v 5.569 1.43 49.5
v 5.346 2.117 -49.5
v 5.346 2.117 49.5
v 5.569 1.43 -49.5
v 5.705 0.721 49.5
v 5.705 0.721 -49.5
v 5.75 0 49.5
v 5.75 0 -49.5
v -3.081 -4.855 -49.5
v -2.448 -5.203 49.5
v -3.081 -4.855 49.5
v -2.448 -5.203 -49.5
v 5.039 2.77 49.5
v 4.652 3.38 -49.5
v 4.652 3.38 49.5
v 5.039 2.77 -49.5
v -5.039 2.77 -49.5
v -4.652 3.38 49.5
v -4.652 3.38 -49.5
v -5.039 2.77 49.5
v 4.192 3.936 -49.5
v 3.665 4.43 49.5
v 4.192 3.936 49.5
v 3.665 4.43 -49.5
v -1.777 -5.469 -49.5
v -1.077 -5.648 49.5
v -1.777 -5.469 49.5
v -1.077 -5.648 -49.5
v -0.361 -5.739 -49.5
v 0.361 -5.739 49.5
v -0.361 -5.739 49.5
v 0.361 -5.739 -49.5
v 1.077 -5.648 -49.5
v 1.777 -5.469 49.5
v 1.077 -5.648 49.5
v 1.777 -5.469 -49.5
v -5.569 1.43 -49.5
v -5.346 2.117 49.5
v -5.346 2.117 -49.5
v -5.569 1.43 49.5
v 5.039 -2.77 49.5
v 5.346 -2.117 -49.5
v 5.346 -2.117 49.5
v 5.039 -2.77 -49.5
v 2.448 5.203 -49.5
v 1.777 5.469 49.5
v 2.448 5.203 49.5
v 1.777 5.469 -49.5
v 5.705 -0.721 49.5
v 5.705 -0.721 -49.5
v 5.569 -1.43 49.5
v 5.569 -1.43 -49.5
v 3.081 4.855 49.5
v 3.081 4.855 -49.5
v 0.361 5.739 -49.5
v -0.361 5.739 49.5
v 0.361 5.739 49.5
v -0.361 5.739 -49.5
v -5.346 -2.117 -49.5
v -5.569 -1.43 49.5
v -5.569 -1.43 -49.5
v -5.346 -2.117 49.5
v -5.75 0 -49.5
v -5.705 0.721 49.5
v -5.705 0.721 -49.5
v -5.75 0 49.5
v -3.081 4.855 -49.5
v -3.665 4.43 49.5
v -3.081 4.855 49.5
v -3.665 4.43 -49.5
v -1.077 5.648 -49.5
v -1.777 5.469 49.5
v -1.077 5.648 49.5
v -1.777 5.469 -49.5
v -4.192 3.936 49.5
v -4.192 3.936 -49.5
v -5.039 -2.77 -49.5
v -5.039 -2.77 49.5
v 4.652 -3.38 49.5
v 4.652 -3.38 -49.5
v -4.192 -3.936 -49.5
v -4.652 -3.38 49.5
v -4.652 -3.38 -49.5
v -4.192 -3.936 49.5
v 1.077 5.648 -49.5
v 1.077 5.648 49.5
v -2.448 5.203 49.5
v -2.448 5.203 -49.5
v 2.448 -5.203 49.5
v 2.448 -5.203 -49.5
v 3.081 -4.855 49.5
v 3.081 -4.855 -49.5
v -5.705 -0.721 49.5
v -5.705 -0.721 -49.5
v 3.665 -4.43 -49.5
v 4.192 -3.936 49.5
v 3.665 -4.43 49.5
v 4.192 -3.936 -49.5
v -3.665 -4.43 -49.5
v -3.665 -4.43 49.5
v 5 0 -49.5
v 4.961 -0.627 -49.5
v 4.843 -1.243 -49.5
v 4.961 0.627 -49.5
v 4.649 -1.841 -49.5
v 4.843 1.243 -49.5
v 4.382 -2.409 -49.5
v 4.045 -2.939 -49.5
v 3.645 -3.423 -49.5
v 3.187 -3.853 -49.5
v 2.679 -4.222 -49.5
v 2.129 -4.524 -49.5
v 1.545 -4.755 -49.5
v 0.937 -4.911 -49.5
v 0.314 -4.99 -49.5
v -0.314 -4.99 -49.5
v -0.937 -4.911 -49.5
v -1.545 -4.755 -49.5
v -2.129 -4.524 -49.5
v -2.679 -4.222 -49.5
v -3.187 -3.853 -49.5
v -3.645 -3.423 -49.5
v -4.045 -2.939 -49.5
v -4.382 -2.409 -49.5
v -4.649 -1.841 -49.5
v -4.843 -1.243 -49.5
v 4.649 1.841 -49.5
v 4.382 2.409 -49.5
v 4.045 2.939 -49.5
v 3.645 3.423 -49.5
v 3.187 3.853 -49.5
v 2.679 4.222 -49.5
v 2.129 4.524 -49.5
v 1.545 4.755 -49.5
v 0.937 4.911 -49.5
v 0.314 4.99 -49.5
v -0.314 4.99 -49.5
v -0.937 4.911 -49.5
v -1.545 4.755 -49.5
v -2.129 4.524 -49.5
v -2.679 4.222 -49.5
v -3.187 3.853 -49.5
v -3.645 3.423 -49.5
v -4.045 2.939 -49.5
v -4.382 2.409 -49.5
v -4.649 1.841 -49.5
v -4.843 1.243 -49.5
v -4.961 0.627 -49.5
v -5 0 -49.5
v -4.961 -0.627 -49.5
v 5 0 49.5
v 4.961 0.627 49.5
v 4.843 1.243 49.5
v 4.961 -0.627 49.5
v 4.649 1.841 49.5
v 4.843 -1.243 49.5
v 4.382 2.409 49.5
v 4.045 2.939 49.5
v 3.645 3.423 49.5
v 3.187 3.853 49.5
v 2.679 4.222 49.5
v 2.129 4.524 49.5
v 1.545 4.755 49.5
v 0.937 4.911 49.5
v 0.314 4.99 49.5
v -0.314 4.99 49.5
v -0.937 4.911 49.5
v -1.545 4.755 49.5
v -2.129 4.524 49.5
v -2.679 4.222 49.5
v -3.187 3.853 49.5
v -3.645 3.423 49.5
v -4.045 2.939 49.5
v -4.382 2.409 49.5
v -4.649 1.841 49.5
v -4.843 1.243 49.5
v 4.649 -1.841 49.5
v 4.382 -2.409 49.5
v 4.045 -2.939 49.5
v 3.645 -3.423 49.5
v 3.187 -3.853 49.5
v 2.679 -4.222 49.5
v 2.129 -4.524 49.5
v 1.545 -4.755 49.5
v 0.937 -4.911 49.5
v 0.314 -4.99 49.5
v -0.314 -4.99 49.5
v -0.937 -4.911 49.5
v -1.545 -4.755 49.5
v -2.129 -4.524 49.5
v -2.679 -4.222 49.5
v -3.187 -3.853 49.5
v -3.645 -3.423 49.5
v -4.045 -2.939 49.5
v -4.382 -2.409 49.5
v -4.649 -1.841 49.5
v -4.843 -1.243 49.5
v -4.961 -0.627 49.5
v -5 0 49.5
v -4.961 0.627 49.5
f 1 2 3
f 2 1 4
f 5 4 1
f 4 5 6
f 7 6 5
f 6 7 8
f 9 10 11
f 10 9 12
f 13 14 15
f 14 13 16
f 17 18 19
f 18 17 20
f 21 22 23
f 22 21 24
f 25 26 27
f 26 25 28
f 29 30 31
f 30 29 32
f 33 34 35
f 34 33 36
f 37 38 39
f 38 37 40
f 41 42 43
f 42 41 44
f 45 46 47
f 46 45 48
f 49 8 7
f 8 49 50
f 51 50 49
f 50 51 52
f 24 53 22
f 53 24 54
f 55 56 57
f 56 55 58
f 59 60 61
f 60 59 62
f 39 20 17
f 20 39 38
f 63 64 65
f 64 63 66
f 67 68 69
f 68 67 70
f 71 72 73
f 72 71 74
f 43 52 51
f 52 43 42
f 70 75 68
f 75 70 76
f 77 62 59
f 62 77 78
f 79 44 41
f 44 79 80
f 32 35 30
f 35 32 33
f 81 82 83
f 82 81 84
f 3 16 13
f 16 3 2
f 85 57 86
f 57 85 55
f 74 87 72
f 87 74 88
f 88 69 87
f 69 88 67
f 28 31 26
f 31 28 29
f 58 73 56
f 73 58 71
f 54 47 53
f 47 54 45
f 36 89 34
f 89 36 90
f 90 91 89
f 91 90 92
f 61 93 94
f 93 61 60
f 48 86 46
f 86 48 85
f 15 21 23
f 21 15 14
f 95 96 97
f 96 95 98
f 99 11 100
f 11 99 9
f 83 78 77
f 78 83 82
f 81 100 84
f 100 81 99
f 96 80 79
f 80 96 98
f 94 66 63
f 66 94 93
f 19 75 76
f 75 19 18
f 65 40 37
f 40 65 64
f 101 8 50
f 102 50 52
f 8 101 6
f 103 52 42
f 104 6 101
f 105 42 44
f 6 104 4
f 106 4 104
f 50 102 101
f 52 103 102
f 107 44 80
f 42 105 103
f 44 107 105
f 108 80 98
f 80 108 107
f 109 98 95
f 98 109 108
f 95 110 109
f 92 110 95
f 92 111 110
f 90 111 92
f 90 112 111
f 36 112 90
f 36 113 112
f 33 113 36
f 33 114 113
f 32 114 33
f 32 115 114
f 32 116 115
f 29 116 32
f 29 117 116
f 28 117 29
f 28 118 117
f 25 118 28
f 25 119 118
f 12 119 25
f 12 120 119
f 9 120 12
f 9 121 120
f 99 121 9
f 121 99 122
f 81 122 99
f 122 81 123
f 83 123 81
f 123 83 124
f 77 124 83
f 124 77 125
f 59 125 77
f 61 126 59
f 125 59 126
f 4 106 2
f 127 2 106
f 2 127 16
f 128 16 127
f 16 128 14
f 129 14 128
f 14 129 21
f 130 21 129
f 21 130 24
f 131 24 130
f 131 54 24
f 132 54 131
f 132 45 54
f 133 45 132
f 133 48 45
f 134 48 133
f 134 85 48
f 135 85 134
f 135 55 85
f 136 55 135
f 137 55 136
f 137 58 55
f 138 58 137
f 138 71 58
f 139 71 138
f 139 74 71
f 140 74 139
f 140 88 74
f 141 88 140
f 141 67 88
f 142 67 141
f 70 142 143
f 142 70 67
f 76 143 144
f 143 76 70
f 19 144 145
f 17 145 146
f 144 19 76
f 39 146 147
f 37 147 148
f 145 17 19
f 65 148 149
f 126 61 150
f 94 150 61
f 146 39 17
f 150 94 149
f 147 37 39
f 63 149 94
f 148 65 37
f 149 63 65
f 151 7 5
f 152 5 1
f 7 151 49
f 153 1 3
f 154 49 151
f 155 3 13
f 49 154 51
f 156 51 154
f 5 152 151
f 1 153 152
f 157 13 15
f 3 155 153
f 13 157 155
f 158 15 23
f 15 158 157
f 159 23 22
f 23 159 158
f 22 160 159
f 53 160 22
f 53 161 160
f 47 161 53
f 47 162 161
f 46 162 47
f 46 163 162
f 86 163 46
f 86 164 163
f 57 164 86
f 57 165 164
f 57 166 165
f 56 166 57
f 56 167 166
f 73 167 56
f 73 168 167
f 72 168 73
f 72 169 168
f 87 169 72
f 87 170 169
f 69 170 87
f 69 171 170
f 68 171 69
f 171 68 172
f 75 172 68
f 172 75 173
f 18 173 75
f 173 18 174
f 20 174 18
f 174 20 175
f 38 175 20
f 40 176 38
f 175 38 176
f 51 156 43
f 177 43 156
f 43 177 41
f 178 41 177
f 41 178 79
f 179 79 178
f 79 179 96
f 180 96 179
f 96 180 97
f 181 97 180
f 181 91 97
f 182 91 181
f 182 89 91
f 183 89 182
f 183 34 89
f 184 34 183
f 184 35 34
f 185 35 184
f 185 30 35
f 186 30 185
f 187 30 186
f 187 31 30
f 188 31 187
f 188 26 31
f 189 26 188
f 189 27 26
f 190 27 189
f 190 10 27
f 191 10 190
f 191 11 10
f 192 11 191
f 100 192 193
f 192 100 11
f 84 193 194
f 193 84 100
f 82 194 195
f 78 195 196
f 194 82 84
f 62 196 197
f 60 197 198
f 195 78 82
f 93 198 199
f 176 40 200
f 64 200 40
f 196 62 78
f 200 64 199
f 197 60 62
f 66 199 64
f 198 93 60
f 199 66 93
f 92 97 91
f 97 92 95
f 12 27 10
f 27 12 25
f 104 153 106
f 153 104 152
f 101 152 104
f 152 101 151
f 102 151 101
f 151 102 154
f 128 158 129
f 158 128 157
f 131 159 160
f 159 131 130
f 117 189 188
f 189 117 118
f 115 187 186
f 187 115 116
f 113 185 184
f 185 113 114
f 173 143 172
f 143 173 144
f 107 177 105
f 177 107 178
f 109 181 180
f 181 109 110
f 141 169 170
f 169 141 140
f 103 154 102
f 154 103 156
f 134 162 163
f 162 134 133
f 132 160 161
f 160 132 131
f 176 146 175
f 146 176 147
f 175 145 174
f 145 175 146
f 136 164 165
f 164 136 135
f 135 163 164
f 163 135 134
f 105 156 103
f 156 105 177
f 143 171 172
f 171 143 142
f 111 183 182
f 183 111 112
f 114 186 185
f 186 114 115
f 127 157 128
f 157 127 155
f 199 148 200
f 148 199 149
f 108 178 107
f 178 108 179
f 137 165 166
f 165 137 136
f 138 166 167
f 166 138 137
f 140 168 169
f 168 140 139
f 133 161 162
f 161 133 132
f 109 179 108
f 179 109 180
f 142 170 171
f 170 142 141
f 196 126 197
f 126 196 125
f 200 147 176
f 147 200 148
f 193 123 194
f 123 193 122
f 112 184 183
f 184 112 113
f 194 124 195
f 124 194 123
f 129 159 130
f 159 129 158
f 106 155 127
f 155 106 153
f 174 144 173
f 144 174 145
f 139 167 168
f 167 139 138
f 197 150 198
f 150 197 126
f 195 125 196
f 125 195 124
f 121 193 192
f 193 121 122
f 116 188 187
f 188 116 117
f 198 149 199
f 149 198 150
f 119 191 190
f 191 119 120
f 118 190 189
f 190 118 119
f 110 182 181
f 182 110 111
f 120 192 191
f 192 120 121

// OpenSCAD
$fn = 50;


difference() {
	union() {
		translate(v = [0, 0, -49.5000000000]) {
			cylinder(h = 99, r = 5.7500000000);
		}
	}
	union() {
		translate(v = [0, 0, -100.0000000000]) {
			cylinder(h = 200, r = 5.0000000000);
		}
	}
}
